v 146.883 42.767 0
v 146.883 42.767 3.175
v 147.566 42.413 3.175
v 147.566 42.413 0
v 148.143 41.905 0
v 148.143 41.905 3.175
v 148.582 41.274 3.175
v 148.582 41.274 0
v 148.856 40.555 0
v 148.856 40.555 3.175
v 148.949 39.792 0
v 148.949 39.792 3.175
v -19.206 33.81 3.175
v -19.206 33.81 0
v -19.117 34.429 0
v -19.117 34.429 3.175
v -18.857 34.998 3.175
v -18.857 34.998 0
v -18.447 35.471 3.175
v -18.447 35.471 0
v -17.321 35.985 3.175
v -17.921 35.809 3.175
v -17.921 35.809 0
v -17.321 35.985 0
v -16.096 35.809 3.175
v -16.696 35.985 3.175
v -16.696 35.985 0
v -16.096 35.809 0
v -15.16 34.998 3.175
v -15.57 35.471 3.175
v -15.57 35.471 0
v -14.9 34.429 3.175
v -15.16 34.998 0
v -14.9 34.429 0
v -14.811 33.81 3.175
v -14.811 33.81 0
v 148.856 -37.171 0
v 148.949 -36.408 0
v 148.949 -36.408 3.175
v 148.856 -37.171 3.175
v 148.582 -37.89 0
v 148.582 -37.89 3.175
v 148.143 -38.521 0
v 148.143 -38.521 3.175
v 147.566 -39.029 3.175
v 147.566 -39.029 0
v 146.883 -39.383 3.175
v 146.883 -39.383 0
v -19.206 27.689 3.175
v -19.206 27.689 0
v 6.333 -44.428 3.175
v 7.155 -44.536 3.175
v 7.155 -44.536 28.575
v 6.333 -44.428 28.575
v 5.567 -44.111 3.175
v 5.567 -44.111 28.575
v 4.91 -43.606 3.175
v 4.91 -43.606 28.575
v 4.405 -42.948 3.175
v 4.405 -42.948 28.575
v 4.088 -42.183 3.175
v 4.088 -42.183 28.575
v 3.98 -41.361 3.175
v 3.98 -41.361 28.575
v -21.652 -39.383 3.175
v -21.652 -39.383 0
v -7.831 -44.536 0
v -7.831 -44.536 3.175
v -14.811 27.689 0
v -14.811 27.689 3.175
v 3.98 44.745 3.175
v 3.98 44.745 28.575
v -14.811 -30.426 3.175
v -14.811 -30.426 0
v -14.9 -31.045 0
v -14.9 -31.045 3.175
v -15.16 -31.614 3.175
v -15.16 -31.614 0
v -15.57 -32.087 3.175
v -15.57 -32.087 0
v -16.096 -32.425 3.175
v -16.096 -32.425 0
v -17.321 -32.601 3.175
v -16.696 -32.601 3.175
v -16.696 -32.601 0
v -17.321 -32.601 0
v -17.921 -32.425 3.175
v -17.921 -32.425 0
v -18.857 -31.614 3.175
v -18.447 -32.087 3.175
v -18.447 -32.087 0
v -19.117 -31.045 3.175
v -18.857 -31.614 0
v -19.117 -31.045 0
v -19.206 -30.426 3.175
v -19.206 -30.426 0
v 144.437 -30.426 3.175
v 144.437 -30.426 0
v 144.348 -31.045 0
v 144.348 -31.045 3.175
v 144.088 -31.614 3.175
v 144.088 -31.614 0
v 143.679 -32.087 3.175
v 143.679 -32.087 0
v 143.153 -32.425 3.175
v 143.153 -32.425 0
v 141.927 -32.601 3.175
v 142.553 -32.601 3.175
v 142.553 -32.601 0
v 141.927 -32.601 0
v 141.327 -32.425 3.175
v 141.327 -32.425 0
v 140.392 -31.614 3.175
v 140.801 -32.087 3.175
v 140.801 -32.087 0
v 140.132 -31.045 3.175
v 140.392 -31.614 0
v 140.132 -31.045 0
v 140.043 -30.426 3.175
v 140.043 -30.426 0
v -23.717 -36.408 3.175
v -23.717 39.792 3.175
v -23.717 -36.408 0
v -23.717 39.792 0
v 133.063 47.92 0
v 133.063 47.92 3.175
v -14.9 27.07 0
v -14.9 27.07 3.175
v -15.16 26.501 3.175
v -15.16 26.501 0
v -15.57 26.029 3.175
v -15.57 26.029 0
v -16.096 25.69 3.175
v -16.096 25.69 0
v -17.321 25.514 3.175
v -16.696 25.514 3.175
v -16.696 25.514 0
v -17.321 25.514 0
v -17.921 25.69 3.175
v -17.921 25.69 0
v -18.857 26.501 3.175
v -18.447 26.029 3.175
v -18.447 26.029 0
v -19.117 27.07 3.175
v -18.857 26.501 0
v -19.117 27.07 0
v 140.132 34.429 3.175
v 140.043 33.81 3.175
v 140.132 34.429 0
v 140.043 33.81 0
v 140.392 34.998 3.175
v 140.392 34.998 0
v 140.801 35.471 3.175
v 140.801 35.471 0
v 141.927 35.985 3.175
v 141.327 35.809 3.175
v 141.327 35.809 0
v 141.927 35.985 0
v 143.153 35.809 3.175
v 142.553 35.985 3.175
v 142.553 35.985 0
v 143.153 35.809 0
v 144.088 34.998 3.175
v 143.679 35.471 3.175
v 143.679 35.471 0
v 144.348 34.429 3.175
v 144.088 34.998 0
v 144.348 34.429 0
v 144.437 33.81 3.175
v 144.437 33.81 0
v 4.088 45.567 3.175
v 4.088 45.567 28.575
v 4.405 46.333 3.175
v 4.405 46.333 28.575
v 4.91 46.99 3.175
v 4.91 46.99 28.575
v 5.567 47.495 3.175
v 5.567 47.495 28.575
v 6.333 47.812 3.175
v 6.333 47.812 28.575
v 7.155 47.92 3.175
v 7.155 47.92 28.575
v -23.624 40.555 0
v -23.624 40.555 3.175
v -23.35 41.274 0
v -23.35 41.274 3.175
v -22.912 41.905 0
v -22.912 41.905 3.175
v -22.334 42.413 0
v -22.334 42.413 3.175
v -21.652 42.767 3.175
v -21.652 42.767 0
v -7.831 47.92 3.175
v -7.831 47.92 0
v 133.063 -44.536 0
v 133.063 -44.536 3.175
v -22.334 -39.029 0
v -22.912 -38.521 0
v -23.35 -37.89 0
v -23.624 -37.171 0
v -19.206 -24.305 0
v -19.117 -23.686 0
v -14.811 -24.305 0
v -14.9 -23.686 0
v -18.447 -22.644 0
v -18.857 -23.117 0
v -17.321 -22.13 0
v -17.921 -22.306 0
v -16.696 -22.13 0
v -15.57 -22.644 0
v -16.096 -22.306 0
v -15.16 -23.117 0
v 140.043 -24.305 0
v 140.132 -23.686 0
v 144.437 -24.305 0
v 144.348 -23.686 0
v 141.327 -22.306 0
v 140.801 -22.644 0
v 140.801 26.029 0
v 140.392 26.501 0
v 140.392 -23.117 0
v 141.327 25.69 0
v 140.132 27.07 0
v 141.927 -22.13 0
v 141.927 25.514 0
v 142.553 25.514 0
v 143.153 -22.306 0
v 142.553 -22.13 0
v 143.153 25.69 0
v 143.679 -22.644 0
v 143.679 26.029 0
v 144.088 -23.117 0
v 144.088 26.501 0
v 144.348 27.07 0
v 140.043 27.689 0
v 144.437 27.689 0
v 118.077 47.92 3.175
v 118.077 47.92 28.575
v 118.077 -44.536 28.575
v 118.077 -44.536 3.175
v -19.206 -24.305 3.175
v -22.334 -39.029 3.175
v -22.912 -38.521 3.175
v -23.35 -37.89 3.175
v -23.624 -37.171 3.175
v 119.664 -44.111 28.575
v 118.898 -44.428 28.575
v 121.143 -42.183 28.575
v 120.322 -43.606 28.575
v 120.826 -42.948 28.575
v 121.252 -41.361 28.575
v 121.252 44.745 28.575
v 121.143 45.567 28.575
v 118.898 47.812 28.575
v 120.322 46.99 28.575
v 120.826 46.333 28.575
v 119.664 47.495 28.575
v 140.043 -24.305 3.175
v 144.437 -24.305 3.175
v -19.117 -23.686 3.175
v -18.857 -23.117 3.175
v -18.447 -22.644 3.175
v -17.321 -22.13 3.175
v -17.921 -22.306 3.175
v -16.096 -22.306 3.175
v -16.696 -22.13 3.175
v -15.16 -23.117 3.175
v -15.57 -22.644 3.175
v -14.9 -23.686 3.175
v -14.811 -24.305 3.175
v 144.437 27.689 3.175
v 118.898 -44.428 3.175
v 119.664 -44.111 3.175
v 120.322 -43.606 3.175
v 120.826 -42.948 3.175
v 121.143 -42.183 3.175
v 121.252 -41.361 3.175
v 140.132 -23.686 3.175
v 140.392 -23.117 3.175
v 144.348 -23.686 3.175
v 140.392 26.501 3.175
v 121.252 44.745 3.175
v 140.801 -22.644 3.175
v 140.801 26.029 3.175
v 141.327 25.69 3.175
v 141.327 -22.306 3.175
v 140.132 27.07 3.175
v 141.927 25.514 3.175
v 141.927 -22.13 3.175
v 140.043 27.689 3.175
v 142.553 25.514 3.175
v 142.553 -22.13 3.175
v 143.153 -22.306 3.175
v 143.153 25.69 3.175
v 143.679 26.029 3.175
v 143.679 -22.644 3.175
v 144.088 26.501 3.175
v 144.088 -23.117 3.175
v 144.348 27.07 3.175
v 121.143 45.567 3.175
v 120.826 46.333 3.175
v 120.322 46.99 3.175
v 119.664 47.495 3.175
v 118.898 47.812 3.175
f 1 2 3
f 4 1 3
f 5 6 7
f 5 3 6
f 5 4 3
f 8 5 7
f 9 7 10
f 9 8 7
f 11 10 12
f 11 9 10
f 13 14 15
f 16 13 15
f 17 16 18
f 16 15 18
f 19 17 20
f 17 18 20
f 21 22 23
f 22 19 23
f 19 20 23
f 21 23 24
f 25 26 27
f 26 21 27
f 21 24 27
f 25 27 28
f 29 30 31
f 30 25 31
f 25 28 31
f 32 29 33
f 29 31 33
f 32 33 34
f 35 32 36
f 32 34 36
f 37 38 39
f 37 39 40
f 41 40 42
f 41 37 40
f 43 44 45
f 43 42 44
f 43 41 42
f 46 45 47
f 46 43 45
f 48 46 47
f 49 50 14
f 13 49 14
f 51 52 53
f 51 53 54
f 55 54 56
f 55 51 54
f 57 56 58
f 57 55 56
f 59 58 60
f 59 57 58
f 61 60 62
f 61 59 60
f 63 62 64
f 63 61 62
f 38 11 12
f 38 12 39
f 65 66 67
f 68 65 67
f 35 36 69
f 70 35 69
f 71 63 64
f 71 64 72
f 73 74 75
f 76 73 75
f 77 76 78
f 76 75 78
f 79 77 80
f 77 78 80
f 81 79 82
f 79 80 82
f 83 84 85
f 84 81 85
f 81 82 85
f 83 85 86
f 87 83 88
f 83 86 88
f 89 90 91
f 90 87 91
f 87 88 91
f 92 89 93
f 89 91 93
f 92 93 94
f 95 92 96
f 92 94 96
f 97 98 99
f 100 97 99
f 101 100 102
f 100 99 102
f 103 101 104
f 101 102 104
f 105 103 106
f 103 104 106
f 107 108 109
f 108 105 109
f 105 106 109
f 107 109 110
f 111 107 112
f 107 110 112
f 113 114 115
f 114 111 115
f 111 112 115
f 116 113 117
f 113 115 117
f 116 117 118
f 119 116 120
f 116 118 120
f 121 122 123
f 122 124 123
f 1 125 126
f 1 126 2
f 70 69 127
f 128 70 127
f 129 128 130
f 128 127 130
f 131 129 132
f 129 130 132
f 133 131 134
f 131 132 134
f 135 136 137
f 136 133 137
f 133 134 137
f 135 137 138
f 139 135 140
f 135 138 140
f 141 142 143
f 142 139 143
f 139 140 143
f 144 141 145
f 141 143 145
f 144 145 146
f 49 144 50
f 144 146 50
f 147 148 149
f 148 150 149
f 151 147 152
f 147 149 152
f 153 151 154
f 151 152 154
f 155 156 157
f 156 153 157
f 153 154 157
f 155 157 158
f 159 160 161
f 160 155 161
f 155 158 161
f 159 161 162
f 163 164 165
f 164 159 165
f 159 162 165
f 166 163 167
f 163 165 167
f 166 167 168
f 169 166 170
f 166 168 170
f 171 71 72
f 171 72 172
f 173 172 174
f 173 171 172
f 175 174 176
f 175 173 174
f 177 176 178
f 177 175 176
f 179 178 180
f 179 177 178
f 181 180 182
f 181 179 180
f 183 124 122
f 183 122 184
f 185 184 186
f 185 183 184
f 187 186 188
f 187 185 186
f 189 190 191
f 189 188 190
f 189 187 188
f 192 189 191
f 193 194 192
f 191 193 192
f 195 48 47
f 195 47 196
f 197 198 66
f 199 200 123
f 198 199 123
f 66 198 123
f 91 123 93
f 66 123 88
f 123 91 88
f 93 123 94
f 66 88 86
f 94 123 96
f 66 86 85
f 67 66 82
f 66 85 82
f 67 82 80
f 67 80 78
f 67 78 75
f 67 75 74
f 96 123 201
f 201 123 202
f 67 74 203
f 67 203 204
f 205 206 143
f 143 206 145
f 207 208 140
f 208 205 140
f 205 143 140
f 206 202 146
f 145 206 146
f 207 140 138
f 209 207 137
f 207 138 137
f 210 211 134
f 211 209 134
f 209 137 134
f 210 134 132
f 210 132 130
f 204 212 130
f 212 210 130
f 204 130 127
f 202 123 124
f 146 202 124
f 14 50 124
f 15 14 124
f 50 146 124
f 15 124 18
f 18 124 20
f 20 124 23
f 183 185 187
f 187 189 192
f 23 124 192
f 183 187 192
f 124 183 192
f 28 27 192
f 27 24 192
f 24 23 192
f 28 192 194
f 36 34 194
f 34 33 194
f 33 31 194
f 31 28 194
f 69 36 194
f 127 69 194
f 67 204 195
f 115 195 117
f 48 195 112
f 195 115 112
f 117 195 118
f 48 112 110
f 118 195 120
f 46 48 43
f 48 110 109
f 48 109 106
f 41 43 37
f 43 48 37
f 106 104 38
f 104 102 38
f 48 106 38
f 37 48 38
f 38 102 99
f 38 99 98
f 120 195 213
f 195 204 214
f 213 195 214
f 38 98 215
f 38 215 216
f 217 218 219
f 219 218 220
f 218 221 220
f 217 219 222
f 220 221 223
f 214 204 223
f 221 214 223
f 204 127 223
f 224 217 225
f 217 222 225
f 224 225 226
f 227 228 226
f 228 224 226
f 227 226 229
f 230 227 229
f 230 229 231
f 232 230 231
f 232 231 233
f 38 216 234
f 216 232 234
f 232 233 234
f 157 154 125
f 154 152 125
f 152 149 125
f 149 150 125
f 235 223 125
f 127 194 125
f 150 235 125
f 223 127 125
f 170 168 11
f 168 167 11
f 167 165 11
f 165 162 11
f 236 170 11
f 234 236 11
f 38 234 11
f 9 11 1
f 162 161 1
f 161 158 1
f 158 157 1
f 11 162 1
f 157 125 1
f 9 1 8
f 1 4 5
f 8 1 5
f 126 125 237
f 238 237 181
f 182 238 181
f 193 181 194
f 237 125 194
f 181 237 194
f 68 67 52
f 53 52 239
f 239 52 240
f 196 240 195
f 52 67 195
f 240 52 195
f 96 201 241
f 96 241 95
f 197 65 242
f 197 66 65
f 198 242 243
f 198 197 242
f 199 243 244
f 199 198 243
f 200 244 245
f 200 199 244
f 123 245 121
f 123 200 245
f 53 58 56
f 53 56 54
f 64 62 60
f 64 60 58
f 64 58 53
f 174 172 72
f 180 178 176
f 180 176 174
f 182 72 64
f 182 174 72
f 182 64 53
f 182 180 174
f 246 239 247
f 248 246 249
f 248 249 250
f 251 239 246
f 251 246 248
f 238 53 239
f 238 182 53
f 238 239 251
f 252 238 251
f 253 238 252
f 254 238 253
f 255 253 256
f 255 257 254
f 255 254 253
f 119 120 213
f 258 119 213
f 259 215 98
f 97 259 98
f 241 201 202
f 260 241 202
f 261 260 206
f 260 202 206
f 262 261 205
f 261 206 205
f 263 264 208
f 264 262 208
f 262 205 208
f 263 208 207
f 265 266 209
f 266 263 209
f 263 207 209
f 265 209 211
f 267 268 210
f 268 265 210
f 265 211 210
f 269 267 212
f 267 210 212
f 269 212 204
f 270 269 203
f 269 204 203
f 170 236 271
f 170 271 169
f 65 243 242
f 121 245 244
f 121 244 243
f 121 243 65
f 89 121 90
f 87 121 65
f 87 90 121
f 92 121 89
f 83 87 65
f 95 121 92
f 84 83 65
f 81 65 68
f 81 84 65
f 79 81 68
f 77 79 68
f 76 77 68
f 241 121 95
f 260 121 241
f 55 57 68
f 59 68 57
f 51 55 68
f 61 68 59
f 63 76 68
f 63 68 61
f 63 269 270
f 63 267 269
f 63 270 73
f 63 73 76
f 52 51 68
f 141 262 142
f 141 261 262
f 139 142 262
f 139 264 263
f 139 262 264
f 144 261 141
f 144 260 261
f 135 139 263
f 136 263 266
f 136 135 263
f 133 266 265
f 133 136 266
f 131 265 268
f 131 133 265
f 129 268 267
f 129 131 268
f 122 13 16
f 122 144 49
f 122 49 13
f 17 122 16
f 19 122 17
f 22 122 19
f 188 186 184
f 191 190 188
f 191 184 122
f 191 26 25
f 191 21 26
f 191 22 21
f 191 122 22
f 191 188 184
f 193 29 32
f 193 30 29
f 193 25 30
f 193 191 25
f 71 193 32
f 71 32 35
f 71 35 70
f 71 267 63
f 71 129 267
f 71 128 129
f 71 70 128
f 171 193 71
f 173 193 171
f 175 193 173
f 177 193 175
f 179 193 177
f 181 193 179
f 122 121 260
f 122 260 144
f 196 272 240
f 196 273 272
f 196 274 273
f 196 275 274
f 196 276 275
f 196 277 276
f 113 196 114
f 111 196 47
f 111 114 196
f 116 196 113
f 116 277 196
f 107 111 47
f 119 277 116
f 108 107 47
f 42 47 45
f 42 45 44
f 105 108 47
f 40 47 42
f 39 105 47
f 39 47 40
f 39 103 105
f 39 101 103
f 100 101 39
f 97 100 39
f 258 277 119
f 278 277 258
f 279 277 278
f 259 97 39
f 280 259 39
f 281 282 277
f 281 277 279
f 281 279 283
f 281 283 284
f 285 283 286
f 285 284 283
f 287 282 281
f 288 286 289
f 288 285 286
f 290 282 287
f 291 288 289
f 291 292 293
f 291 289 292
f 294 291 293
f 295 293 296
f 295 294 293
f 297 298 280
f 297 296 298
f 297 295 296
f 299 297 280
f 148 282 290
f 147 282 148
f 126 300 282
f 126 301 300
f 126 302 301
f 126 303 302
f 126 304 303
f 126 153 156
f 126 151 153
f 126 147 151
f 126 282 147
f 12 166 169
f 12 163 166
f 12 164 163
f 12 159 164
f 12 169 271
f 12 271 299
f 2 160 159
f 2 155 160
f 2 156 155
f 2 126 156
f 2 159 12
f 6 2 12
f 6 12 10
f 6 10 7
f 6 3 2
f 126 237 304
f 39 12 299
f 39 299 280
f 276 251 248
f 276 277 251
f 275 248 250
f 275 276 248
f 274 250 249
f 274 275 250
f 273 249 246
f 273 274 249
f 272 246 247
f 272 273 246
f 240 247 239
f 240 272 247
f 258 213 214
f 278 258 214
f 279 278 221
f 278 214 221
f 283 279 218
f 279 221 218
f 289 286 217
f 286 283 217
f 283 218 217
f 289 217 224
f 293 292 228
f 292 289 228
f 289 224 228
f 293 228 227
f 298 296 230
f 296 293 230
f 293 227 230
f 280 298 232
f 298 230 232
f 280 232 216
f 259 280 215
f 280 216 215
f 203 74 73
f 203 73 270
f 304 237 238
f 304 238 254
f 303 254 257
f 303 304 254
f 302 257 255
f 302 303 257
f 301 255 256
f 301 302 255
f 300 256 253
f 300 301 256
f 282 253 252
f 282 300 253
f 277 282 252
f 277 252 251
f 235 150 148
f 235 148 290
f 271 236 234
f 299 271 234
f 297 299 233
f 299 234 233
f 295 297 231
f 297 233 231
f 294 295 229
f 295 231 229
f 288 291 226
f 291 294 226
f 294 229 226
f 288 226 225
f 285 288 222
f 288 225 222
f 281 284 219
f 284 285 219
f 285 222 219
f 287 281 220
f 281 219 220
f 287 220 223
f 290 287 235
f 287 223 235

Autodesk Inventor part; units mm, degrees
ref_plane "YZ Plane" through (0, 0, 0) normal (1, 0, 0) x (0, 1, 0)
ref_plane "XZ Plane" through (0, 0, 0) normal (0, 1, 0) x (-1, 0, 0)
ref_plane "XY Plane" through (0, 0, 0) normal (0, 0, 1) x (1, 0, 0)
sketch "Sketch1" plane through (0, 0, 0) normal (0, 0, 1) x (1, 0, 0)
  line L0 (-7.8312, -44.5359) -> (133.0626, -44.5359)
  line L1 (133.0626, -44.5359) -> (133.0626, 47.9201)
  line L2 (133.0626, 47.9201) -> (-7.8312, 47.9201)
  line L3 (-7.8312, 47.9201) -> (-7.8312, -44.5359)
  line L4 (-7.8312, 47.9201) -> (-21.6516, 42.767)
  arc A0 (-21.6516, 42.767) -> (-23.7173, 39.7921) centre (-20.5423, 39.7921) ccw
  line L5 (-23.7173, 39.7921) -> (-23.7173, -36.4079)
  arc A1 (-23.7173, -36.4079) -> (-21.6516, -39.3828) centre (-20.5423, -36.4079) ccw
  line L6 (-21.6516, -39.3828) -> (-7.8312, -44.5359)
  circle A2 centre (-17.0085, 33.8104) radius 2.1971
  circle A3 centre (-17.0085, 27.689) radius 2.1971
  line L7 (-19.2056, 33.8104) -> (-14.8114, 33.8104)
  line L8 (-14.8114, 33.8104) -> (-14.8114, 27.689)
  line L9 (-14.8114, 27.689) -> (-19.2056, 27.689)
  line L10 (-19.2056, 27.689) -> (-19.2056, 33.8104)
  line L11 (-7.8312, 1.6921) -> (-23.7173, 1.6921)
  circle A4 centre (-17.0085, -30.4262) radius 2.1971
  circle A5 centre (-17.0085, -24.3048) radius 2.1971
  line L12 (-19.2056, -30.4262) -> (-14.8114, -30.4262)
  line L13 (-14.8114, -30.4262) -> (-14.8114, -24.3048)
  line L14 (-14.8114, -24.3048) -> (-19.2056, -24.3048)
  line L15 (-19.2056, -24.3048) -> (-19.2056, -30.4262)
  line L16 (62.6157, 47.9201) -> (62.6157, -44.5359)
  line L17 (133.0626, 47.9201) -> (146.8831, 42.767)
  arc A6 (148.9488, 39.7921) -> (146.8831, 42.767) centre (145.7738, 39.7921) ccw
  line L18 (148.9488, 39.7921) -> (148.9488, -36.4079)
  arc A7 (146.8831, -39.3828) -> (148.9488, -36.4079) centre (145.7738, -36.4079) ccw
  line L19 (146.8831, -39.3828) -> (133.0626, -44.5359)
  circle A8 centre (142.24, 33.8104) radius 2.1971
  circle A9 centre (142.24, 27.689) radius 2.1971
  line L20 (144.4371, 33.8104) -> (140.0429, 33.8104)
  line L21 (140.0429, 33.8104) -> (140.0429, 27.689)
  line L22 (140.0429, 27.689) -> (144.4371, 27.689)
  line L23 (144.4371, 27.689) -> (144.4371, 33.8104)
  line L24 (133.0626, 1.6921) -> (148.9488, 1.6921)
  circle A10 centre (142.24, -30.4262) radius 2.1971
  line L25 (144.4371, -30.4262) -> (140.0429, -30.4262)
  line L26 (140.0429, -30.4262) -> (140.0429, -24.3048)
  line L27 (140.0429, -24.3048) -> (144.4371, -24.3048)
  line L28 (144.4371, -24.3048) -> (144.4371, -30.4262)
  circle A11 centre (142.24, -24.3048) radius 2.1971
  point P0 (0, 0)
  point P1 (125.2315, 0)
  dimension "d4" = 4.3942
  dimension "d0" = 92.456
  dimension "d1" = 140.8938
  dimension "d2" = 3.175
  dimension "d3" = 76.2
  dimension "d5" = 6.1214
  dimension "d6" = 25.9969
extrude "Extrusion1" add sketch "Sketch1" along normal blind 3.175
sketch "Sketch2" plane through (0, 0, 3.175) normal (0, 0, 1) x (1, 0, 0)
  line L0 (133.0626, -44.5359) -> (-7.8312, -44.5359) projected
  line L1 (-7.8312, 47.9201) -> (133.0626, 47.9201) projected
  line L2 (7.1548, 47.9201) -> (118.0766, 47.9201)
  line L3 (121.2516, 44.7451) -> (121.2516, -41.3609)
  line L4 (118.0766, -44.5359) -> (7.1548, -44.5359)
  line L5 (3.9798, -41.3609) -> (3.9798, 44.7451)
  arc A0 (7.1548, 47.9201) -> (3.9798, 44.7451) centre (7.1548, 44.7451) ccw
  arc A1 (3.9798, -41.3609) -> (7.1548, -44.5359) centre (7.1548, -41.3609) ccw
  arc A2 (118.0766, -44.5359) -> (121.2516, -41.3609) centre (118.0766, -41.3609) ccw
  arc A3 (121.2516, 44.7451) -> (118.0766, 47.9201) centre (118.0766, 44.7451) ccw
  point P0 (0, 0)
  point P1 (3.9798, 47.9201)
  point P2 (121.2516, -44.5359)
  point P3 (62.6157, 47.9201)
  dimension "d9" = 117.2718
  dimension "d10" = 3.175
extrude "Extrusion2" add sketch "Sketch2" along normal blind 25.4
properties part number "LIDAR PSU"
